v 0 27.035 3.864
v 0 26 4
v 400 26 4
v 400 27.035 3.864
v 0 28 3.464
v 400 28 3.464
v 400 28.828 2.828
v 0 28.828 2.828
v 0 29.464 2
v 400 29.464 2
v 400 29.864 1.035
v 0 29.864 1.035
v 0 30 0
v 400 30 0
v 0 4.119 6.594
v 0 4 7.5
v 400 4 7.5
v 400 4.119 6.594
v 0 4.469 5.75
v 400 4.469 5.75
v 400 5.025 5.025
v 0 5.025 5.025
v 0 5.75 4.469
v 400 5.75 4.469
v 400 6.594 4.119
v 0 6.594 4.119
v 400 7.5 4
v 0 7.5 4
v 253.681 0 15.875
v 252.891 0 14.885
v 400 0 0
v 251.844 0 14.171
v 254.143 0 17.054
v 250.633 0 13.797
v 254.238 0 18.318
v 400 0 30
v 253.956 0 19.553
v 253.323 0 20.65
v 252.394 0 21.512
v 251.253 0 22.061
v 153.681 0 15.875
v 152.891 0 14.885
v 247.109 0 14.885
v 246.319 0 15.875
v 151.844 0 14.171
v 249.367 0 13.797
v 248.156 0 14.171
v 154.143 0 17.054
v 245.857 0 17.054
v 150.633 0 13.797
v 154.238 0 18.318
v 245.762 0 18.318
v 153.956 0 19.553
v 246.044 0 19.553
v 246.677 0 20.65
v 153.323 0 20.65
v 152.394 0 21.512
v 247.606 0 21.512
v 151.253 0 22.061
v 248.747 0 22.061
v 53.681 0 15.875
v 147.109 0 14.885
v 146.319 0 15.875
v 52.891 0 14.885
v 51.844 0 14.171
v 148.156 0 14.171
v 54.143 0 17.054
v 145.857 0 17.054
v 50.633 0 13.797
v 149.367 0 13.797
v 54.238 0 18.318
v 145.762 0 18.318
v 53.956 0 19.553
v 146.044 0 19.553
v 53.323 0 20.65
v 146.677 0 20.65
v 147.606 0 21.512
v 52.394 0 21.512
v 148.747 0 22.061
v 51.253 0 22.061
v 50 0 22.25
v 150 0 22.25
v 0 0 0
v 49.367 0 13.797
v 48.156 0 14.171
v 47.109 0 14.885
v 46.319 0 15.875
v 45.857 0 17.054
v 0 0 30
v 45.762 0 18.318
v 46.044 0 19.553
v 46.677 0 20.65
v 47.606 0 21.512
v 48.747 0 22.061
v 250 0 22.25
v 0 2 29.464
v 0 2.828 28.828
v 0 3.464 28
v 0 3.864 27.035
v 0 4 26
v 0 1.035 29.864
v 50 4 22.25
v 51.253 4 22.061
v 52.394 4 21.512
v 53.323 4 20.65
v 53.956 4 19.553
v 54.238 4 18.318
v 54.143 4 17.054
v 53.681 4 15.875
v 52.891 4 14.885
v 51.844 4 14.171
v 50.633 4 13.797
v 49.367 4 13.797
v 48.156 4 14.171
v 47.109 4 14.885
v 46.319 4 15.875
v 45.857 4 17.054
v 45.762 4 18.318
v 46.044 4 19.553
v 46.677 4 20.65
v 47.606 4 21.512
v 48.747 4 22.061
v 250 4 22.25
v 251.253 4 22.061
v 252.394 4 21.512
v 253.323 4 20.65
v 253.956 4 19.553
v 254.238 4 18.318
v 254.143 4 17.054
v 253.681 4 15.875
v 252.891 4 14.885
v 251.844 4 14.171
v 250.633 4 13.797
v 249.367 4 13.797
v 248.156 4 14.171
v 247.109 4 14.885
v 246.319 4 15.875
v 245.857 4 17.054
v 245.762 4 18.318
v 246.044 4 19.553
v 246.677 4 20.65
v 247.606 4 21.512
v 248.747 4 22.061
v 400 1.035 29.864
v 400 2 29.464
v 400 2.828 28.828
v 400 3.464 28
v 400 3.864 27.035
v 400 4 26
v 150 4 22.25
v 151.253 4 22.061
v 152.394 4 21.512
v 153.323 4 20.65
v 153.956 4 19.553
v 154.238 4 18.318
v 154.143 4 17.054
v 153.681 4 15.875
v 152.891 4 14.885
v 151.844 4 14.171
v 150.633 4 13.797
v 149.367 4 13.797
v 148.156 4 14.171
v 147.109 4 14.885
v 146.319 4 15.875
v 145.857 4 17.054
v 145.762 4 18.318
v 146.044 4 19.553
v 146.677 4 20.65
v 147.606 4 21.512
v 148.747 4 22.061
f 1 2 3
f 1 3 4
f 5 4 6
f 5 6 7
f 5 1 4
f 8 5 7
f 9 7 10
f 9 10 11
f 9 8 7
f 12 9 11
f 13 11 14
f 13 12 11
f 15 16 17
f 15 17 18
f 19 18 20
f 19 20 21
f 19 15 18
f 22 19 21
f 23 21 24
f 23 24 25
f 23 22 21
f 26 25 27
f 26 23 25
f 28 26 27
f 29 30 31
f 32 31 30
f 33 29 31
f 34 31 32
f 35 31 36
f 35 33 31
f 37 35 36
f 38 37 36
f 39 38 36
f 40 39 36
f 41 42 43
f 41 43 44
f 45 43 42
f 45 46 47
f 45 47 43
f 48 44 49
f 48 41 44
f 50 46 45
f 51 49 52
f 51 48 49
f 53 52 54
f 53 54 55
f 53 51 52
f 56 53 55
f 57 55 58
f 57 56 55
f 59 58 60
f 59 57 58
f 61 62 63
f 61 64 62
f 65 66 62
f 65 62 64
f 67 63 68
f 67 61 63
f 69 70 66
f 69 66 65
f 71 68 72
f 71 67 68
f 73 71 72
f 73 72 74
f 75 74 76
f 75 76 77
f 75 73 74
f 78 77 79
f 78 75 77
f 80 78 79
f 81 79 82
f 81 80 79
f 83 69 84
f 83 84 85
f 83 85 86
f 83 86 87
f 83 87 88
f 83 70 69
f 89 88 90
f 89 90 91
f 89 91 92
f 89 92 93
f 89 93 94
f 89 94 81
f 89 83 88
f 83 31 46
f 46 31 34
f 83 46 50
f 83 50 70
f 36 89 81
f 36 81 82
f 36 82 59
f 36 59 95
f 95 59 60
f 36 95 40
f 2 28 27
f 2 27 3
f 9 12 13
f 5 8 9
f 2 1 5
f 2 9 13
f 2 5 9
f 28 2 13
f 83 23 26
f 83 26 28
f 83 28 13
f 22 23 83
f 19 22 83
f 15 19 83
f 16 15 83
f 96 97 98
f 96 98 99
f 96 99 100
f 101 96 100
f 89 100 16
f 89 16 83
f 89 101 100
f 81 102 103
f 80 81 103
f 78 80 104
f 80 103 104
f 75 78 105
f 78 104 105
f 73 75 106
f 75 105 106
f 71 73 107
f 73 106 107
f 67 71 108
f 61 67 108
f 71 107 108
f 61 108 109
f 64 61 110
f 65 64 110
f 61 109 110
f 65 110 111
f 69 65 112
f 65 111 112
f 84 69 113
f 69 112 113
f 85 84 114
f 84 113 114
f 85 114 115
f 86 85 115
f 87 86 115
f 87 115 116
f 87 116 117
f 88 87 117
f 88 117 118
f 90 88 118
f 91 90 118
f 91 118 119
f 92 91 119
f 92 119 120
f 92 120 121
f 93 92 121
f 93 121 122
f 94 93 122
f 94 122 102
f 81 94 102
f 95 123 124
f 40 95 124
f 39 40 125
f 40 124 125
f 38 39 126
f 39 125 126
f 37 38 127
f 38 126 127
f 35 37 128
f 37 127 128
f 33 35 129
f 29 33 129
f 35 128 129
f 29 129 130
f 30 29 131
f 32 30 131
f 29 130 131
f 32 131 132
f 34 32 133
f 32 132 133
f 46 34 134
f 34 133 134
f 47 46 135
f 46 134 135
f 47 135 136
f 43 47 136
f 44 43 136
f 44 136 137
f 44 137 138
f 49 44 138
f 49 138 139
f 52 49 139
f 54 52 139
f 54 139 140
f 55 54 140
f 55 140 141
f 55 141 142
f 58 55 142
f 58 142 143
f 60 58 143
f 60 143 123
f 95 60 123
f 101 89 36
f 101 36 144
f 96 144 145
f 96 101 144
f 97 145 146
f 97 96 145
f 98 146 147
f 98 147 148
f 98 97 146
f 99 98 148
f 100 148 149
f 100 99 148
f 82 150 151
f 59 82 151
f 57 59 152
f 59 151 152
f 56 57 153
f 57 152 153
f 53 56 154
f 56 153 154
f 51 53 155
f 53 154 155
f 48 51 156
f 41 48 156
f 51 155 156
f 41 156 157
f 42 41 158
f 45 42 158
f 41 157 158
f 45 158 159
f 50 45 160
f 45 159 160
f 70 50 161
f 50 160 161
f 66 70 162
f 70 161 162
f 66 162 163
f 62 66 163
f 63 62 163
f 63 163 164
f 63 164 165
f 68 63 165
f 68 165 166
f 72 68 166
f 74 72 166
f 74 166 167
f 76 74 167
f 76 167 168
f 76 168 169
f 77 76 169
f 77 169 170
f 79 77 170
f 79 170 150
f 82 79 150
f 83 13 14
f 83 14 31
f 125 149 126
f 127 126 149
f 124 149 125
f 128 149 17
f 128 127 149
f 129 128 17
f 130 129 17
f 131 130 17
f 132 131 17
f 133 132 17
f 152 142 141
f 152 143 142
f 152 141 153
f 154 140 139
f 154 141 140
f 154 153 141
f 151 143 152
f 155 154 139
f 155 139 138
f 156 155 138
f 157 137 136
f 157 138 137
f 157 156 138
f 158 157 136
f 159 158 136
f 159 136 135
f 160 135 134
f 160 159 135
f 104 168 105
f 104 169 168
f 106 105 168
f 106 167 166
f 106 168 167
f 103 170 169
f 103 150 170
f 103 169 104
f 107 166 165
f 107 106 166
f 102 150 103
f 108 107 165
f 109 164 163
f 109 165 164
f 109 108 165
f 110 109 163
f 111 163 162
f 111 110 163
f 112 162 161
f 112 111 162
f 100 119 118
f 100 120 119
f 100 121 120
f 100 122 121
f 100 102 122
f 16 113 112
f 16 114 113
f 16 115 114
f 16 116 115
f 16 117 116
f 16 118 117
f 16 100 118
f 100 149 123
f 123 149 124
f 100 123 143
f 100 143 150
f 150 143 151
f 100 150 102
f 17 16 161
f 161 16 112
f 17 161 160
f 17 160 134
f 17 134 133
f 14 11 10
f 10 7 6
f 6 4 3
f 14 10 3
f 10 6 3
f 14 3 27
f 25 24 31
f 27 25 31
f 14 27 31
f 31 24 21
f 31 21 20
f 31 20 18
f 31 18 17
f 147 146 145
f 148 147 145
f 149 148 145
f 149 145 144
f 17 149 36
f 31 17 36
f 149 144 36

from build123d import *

# Parameters (mm, degrees)
ANGLE_IRON_25_X_25_X_4_1_DEPTH = 400
SKETCH12_R                     = 4.25
CUT_EXTRUDE1_DEPTH             = 10


with BuildPart() as part:
    # Sketch11 → Angle iron 25 X 25 X 4(1) (new body)
    with BuildSketch(Plane.YZ):
        with BuildLine():
            Line((0, 0), (0, 30))
            ThreePointArc((0, 30), (2.828427125, 28.828427125), (4, 26))
            Line((4, 26), (4, 7.5))
            ThreePointArc((4, 7.5), (5.025126266, 5.025126266), (7.5, 4))
            Line((7.5, 4), (26, 4))
            ThreePointArc((26, 4), (28.828427125, 2.828427125), (30, 0))
            Line((30, 0), (0, 0))
        make_face()
    extrude(amount=ANGLE_IRON_25_X_25_X_4_1_DEPTH)

    # Sketch12 → Cut-Extrude1 (cut)
    with BuildSketch(Plane(origin=(0, 4, 0), x_dir=(1, 0, 0), z_dir=(0, 1, 0))):
        with Locations(Location((50, -18, 0), (0, 0, 270))):
            Circle(SKETCH12_R)
        with Locations(Location((150, -18, 0), (0, 0, 270))):
            Circle(SKETCH12_R)
        with Locations(Location((250, -18, 0), (0, 0, 270))):
            Circle(SKETCH12_R)
    extrude(amount=-CUT_EXTRUDE1_DEPTH, mode=Mode.SUBTRACT)


solid = part.part
